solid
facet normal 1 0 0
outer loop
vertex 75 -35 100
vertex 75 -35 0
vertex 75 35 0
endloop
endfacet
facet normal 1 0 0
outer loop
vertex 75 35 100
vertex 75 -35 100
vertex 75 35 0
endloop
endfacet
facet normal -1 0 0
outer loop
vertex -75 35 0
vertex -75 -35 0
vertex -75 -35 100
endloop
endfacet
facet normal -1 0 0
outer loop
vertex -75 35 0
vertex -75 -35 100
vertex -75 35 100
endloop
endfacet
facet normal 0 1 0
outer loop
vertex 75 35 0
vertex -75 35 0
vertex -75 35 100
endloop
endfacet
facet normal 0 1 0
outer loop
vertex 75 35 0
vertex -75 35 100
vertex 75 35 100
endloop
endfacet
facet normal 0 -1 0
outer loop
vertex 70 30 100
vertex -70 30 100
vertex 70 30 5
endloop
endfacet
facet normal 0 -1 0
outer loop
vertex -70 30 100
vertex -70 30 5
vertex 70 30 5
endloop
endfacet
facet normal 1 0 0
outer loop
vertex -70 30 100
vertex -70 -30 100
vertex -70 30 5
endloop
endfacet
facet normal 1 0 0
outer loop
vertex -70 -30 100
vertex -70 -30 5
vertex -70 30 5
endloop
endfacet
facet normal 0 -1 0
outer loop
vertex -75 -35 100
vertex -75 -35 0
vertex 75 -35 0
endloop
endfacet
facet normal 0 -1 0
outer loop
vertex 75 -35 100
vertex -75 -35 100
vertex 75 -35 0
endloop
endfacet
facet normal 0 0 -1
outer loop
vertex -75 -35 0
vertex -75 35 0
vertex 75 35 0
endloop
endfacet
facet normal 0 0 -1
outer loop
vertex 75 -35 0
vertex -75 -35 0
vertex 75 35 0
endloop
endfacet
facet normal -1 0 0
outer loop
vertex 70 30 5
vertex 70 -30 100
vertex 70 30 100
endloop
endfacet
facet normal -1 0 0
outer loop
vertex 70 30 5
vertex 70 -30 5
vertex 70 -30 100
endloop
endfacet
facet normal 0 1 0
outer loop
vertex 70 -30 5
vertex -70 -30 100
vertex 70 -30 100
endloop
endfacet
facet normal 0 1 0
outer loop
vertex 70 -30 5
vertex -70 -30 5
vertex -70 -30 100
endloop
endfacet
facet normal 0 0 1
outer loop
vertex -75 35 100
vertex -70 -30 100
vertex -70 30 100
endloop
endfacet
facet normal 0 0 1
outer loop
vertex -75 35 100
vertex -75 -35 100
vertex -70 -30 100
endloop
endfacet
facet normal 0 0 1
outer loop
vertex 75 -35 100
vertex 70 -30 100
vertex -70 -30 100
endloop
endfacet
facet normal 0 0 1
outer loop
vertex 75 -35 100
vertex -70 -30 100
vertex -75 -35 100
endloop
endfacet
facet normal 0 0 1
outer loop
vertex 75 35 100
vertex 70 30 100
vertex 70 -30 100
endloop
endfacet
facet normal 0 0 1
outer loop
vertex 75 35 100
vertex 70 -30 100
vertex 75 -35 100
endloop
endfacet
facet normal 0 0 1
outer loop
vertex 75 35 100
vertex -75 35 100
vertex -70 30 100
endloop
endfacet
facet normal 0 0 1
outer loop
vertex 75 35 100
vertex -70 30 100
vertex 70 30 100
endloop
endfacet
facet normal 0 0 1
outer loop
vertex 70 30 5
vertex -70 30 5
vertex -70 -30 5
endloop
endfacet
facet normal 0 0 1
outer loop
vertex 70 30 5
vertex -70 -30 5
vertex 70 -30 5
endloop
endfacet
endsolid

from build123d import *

# Parameters (mm, degrees)
F0_W     = 150
F0_H     = 70
F1_DEPTH = 100
F2_T     = -5


# Not quite as in the source:
# - the program builds the solid bodies; features that only make, move or delete a surface that nothing else refers to are left out


with BuildPart() as f1:
    # F0 (on Top) → F1 (new body)
    with BuildSketch(Plane.XY):
        Rectangle(F0_W, F0_H)
    extrude(amount=F1_DEPTH)

    # F2
    f2_openings = [f1.faces().sort_by_distance(p)[0] for p in [
        (0, 0, 100),
    ]]
    offset(amount=F2_T, openings=f2_openings)


solid = f1.part
